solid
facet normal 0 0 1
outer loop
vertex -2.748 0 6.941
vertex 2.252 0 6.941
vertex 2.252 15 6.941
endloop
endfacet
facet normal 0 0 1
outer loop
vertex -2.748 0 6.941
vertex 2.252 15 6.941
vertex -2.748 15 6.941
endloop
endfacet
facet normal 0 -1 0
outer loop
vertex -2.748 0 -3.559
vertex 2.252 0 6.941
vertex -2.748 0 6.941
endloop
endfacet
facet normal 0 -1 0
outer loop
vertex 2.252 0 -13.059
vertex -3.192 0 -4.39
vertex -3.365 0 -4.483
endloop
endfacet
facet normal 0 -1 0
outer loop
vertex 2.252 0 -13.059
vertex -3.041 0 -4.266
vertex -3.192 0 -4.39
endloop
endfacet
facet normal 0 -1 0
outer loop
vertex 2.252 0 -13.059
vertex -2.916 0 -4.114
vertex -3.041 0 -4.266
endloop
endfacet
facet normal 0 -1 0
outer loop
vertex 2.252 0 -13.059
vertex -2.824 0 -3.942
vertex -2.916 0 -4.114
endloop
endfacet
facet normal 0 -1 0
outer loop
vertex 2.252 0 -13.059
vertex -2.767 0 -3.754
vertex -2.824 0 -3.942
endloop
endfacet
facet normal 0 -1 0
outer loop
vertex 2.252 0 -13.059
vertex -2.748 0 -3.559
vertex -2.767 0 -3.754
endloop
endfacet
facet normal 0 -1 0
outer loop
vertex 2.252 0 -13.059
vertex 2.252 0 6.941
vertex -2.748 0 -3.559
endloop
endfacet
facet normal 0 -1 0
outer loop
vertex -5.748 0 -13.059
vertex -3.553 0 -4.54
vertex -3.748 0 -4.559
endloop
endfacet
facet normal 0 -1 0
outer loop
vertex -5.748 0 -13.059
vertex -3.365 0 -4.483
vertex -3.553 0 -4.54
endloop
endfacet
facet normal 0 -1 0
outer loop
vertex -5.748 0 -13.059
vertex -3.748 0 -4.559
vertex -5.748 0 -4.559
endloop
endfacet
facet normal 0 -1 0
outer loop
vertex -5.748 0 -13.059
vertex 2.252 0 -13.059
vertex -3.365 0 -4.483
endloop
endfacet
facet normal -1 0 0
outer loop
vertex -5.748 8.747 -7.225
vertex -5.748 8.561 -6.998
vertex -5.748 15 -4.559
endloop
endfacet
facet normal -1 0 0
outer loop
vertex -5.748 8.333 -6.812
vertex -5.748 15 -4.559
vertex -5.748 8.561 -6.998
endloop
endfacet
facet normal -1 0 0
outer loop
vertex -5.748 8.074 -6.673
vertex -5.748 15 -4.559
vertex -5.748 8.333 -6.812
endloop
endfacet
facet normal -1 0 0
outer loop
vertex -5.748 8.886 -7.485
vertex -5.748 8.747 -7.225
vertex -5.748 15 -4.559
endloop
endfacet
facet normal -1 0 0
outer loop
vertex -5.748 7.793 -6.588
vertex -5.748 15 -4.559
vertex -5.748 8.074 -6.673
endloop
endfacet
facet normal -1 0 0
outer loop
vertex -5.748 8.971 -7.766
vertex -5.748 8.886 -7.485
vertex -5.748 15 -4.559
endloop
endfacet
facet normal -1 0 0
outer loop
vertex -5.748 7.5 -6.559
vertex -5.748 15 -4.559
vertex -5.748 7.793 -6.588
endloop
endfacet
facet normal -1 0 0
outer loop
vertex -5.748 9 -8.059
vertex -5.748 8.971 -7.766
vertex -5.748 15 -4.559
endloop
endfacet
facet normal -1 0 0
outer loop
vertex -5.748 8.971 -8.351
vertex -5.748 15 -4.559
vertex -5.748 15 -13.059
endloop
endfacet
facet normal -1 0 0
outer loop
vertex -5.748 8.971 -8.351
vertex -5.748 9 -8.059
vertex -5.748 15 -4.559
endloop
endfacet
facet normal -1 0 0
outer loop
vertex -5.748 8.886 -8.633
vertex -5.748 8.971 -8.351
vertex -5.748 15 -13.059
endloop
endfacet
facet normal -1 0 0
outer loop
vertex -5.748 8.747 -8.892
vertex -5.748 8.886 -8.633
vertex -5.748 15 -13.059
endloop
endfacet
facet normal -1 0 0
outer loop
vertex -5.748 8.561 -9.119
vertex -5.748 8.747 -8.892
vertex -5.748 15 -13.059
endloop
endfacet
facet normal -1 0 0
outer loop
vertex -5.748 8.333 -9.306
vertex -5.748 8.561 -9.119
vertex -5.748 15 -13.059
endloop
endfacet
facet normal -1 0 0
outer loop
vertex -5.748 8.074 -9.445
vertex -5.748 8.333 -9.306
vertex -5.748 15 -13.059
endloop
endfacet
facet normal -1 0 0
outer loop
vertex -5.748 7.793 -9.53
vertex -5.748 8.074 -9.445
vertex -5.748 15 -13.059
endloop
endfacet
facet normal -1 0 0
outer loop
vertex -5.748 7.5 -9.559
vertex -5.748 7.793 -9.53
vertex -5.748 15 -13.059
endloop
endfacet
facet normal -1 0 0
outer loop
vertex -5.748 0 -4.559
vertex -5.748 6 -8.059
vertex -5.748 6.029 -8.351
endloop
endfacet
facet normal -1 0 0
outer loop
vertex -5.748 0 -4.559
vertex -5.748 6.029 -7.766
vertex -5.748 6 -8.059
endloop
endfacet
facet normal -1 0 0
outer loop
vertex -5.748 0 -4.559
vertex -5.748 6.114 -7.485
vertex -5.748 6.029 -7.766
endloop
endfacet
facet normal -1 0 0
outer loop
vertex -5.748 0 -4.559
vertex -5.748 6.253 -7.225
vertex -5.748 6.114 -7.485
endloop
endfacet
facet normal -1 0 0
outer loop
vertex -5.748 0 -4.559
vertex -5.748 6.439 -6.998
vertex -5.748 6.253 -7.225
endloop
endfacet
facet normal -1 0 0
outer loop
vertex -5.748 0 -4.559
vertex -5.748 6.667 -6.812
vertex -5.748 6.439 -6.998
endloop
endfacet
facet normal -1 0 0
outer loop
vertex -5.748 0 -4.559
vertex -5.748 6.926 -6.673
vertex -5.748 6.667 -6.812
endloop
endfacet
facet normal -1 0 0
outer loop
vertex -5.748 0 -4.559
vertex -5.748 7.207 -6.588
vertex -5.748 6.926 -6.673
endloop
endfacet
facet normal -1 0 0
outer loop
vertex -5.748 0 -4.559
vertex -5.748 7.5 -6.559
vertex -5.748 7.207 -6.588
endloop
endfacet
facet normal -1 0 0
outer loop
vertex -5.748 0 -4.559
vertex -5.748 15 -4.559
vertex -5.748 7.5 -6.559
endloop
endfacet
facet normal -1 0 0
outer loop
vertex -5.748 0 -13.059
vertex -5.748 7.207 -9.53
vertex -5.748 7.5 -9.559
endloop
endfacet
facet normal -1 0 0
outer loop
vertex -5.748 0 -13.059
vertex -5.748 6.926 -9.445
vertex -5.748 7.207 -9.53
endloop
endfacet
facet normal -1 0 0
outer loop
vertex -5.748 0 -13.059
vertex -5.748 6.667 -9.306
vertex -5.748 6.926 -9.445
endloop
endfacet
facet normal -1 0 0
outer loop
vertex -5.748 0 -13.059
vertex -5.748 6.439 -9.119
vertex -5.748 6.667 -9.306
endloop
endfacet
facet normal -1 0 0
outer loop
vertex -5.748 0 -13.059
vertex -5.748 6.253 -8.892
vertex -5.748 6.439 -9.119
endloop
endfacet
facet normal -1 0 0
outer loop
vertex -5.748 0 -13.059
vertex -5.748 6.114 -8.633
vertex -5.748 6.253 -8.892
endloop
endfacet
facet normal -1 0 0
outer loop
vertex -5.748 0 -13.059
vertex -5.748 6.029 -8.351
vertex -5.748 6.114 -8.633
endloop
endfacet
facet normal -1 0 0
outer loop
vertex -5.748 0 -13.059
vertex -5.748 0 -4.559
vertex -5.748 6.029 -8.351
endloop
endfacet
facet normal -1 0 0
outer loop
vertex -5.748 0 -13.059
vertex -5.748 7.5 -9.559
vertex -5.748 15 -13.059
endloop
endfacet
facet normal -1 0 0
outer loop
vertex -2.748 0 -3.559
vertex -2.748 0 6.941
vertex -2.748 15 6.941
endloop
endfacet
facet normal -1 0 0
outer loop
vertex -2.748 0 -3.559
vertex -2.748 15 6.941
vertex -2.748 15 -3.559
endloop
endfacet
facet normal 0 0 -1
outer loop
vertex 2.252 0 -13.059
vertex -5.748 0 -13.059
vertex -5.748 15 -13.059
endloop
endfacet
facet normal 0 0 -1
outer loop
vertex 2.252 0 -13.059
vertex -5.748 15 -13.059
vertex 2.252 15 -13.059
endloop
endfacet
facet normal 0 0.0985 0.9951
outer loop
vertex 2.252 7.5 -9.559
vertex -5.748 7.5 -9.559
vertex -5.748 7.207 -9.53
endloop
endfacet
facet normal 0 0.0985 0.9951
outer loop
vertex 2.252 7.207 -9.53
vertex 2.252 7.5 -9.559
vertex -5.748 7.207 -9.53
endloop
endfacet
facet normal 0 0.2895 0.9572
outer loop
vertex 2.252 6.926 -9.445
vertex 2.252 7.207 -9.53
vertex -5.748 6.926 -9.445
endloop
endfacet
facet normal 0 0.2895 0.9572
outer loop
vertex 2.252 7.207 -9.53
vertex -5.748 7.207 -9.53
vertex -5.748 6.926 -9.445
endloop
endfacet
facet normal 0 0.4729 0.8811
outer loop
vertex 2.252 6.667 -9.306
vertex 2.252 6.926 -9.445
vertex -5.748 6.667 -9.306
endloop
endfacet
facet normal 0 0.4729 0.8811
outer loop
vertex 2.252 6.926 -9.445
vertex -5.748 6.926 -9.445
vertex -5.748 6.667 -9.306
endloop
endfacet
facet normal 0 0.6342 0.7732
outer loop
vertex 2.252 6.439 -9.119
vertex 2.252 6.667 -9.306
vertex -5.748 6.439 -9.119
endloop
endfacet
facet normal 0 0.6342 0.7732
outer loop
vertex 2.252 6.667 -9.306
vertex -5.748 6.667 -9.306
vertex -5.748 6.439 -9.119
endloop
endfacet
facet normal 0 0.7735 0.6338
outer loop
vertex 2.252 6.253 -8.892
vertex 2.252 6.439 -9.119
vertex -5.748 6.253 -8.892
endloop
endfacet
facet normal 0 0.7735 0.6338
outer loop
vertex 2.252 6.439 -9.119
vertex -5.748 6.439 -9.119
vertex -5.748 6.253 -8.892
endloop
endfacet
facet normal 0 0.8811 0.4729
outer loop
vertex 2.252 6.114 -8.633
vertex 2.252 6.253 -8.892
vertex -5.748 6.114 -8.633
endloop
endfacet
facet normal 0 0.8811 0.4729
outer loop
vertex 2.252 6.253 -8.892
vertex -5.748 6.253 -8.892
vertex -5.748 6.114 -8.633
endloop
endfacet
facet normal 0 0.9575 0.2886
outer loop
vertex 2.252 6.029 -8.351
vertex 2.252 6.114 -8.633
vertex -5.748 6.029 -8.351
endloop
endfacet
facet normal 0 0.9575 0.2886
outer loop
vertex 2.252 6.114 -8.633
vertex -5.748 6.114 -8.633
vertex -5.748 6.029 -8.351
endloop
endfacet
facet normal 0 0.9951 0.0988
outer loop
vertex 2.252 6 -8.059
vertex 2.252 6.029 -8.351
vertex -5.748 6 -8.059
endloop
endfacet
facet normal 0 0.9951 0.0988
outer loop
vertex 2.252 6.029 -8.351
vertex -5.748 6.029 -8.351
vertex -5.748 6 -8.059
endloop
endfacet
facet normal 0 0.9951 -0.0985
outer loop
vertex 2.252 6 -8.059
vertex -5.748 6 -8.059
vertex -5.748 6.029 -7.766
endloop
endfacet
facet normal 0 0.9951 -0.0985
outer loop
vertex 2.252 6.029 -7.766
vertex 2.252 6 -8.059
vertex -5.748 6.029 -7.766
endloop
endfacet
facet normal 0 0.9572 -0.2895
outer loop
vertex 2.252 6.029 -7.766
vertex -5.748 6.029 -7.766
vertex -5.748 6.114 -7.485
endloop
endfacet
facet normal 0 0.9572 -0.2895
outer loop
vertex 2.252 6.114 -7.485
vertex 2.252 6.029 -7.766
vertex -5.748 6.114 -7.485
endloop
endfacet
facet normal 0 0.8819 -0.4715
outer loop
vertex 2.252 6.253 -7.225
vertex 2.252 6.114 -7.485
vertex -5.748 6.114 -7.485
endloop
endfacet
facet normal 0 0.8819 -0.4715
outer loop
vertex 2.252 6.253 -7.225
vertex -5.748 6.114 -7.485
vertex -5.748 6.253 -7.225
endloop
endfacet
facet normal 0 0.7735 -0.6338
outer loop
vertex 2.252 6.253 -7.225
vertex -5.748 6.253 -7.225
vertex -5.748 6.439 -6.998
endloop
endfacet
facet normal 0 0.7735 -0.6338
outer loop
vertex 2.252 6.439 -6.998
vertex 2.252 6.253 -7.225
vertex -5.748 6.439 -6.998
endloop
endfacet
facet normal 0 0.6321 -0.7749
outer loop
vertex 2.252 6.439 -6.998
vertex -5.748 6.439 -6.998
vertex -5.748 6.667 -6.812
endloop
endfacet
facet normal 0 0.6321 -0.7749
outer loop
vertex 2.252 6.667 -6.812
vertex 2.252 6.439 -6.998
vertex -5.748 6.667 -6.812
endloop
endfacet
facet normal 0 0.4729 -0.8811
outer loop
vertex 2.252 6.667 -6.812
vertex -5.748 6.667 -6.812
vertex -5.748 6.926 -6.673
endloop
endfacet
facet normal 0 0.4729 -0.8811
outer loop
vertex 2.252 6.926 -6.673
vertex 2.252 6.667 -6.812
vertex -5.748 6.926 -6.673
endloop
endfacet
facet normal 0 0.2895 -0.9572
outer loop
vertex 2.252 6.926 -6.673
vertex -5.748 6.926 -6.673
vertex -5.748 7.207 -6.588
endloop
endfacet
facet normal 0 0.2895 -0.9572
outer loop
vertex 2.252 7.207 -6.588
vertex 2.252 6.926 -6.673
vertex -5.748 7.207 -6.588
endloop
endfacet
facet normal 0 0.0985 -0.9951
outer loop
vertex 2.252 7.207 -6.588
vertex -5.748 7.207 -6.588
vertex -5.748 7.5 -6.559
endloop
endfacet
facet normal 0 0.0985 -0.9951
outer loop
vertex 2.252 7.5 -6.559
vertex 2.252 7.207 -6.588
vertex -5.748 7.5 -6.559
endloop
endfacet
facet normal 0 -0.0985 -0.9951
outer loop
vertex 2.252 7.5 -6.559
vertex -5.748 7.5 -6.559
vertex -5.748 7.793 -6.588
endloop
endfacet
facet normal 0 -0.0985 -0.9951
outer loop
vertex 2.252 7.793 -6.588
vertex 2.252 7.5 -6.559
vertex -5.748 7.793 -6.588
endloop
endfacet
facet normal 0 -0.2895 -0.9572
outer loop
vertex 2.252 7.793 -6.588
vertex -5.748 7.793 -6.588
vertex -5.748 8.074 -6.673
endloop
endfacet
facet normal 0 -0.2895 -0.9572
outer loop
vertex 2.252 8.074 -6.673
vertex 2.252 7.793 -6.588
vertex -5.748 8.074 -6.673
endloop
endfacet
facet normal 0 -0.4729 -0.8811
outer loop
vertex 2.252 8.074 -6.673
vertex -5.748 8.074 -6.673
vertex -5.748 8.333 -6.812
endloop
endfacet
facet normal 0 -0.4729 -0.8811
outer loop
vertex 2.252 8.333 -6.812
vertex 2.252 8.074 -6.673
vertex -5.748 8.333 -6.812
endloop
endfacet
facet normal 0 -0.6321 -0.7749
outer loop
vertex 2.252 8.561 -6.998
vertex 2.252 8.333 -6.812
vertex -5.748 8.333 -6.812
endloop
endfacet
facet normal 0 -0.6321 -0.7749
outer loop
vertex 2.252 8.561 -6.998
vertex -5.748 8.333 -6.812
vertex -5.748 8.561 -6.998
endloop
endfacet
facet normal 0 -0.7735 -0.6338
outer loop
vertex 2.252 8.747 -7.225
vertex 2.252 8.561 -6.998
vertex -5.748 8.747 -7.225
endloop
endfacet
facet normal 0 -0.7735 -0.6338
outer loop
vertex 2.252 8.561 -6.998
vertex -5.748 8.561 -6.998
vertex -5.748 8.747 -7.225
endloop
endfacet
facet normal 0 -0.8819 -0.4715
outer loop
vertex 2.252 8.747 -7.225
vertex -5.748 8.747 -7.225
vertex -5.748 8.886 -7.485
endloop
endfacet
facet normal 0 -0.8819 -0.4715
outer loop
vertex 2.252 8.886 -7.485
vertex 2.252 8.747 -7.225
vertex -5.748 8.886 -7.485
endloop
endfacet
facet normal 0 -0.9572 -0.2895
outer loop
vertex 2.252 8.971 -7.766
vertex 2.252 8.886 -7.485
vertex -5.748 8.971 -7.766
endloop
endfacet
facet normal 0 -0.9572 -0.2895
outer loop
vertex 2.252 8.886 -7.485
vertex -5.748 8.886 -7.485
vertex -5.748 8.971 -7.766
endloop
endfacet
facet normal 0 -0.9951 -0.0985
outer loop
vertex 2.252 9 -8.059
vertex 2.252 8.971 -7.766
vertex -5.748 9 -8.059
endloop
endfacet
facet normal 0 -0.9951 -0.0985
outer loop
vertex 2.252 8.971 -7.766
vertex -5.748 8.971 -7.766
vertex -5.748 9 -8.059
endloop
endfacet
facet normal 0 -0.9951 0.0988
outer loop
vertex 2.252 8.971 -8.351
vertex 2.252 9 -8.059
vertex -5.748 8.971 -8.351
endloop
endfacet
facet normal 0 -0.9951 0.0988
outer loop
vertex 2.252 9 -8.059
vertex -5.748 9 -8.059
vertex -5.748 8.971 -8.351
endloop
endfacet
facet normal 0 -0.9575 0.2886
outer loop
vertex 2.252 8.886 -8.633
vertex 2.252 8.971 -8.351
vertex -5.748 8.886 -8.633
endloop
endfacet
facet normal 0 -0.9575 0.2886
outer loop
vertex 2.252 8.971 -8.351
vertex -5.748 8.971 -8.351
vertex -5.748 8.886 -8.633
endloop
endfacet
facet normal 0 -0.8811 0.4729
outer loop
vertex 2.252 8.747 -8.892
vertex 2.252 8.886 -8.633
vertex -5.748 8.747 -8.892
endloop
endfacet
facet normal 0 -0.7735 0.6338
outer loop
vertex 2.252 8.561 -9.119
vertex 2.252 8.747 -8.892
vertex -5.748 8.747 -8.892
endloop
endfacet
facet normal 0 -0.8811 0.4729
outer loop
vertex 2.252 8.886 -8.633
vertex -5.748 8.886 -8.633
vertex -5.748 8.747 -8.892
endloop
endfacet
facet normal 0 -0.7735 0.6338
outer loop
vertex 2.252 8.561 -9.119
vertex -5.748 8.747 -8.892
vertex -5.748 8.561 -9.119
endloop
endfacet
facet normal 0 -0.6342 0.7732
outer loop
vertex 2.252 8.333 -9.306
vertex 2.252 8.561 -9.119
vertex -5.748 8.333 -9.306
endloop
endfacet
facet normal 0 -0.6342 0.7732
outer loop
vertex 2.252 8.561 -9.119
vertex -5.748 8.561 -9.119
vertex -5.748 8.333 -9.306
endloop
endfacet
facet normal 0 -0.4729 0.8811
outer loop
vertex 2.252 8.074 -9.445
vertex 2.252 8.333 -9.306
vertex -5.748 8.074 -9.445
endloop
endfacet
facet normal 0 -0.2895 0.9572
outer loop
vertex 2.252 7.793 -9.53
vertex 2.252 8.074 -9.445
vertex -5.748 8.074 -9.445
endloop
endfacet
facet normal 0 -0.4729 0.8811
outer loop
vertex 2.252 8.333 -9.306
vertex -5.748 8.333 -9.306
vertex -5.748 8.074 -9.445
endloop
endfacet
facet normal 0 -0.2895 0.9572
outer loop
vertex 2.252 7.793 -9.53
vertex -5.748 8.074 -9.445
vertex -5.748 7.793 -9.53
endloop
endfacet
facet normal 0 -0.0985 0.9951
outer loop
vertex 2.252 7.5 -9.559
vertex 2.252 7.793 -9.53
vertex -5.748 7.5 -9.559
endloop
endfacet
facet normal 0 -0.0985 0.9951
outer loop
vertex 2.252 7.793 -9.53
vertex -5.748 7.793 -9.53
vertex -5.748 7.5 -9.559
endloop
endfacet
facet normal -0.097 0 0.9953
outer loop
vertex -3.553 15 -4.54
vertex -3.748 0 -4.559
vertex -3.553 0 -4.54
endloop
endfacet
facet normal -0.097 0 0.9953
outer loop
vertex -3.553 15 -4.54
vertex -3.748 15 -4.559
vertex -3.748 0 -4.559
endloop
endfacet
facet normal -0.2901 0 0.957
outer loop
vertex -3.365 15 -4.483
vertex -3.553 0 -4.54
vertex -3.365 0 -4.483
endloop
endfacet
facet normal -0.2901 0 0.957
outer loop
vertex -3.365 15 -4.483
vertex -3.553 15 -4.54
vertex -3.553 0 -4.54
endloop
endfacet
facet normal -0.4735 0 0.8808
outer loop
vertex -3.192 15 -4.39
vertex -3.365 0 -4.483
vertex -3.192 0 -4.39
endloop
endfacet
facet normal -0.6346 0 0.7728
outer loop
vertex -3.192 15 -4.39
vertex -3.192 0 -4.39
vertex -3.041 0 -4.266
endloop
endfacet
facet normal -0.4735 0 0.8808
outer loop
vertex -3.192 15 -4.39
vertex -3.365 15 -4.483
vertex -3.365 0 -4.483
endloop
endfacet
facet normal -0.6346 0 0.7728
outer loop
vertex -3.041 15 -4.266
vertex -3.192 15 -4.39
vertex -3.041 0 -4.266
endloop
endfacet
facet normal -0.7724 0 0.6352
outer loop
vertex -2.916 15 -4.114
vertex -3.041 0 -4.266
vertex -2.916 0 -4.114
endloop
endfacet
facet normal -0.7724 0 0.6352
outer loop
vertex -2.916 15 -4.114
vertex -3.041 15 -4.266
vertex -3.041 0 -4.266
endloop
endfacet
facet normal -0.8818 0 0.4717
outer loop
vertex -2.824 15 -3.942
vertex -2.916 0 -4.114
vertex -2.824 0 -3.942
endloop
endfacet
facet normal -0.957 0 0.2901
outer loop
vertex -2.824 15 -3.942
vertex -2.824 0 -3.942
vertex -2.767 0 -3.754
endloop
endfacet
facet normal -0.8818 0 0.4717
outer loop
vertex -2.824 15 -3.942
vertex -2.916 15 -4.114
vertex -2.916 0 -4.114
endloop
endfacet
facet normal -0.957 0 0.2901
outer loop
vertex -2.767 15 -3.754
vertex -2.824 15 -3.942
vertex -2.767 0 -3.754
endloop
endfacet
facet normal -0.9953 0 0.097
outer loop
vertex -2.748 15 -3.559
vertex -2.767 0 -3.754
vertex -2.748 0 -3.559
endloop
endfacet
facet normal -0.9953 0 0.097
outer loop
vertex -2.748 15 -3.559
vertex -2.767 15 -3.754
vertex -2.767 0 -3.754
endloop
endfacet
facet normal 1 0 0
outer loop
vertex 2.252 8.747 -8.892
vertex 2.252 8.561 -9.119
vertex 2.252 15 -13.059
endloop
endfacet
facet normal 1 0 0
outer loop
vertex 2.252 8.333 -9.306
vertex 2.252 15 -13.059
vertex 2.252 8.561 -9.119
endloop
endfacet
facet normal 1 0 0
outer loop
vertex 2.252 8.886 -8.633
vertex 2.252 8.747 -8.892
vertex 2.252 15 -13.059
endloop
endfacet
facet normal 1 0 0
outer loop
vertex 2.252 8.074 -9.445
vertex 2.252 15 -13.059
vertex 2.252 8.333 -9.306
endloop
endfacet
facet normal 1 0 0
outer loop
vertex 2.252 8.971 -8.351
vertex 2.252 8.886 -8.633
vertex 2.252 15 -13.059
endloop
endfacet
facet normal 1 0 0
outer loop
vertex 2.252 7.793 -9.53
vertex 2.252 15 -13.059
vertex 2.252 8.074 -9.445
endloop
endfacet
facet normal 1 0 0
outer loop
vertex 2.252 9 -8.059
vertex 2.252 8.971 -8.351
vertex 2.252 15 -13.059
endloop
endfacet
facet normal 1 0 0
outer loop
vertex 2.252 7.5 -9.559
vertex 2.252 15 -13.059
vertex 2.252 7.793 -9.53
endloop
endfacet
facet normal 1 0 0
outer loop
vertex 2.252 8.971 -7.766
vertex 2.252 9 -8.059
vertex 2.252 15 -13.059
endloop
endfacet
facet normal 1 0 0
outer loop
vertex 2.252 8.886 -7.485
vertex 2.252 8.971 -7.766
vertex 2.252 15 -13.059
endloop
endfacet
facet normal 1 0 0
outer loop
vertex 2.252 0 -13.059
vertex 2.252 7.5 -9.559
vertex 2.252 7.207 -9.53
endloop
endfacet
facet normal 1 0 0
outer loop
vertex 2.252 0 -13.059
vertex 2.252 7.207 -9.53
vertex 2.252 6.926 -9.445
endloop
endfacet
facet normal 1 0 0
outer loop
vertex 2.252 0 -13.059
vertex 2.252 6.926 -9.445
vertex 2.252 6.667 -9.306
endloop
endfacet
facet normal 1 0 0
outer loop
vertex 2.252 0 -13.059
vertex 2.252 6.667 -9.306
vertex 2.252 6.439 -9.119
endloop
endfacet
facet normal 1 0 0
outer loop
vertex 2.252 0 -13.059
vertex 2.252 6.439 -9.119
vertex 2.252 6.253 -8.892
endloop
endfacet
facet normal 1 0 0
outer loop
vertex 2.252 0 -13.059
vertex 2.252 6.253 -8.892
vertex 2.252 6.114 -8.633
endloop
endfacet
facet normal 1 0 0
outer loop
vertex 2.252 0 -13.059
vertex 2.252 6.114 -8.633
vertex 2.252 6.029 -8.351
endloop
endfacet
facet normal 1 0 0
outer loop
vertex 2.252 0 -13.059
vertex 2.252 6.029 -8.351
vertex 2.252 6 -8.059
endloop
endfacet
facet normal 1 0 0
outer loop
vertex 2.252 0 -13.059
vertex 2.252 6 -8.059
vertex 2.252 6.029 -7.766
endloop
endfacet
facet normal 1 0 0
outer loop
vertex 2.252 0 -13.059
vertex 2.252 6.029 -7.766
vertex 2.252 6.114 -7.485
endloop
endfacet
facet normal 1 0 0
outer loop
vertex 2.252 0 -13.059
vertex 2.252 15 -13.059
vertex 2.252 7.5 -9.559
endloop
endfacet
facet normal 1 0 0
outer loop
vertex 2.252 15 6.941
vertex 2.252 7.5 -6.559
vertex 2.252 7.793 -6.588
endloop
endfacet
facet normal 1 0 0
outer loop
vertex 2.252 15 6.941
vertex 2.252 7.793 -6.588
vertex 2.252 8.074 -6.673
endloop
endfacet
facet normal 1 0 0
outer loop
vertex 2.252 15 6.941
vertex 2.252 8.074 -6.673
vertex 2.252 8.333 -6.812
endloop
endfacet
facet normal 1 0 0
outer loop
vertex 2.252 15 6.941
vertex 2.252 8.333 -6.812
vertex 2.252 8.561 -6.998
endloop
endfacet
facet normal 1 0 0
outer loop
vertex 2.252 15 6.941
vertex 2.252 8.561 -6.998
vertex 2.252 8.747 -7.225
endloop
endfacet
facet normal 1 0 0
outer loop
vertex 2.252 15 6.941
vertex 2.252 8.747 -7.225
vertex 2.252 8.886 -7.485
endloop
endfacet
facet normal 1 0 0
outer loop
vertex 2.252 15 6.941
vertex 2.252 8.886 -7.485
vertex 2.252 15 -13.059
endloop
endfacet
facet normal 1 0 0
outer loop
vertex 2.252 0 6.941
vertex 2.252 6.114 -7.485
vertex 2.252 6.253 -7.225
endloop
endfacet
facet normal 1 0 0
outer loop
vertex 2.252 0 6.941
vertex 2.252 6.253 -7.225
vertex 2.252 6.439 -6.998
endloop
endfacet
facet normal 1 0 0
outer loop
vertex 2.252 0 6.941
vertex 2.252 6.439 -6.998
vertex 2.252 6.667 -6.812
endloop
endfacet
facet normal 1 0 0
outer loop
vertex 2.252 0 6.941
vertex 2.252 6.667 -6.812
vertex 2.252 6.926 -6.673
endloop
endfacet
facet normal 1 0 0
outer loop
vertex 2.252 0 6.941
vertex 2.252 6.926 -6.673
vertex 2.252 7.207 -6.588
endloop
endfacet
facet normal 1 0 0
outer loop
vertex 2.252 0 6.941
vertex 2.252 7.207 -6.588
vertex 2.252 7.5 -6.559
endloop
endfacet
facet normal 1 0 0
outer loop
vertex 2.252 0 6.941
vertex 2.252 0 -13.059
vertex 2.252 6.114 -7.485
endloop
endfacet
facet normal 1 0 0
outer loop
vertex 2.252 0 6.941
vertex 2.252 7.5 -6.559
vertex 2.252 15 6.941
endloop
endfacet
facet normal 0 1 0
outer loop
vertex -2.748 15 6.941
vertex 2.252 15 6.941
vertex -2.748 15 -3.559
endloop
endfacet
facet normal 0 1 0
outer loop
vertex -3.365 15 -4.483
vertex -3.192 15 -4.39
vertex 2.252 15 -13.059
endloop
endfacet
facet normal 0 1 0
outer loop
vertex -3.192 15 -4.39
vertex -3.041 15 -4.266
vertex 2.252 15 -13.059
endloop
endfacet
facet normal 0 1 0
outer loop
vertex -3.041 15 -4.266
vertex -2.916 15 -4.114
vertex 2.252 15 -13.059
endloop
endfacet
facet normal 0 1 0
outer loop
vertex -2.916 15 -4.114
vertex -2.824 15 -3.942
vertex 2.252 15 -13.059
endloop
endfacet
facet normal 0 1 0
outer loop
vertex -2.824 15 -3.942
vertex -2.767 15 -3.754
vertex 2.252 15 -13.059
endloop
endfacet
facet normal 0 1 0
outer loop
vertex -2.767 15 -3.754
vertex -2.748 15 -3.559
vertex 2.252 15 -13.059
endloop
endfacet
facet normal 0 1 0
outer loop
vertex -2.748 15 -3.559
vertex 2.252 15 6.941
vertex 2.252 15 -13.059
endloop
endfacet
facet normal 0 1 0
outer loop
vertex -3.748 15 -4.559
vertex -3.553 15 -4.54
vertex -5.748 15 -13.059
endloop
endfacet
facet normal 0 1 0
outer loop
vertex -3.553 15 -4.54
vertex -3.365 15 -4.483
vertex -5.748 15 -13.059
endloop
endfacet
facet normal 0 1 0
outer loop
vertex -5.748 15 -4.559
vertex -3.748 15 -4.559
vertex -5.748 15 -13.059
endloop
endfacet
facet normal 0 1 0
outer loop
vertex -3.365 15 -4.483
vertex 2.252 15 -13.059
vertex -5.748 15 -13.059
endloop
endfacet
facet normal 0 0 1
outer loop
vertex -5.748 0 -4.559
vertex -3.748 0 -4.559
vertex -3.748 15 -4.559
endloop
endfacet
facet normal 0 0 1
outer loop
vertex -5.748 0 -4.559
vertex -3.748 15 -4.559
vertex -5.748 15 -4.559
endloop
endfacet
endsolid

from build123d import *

# Parameters (mm, degrees)
EXTRUDE_1_DEPTH     = 15
CUT_EXTRUDE_1_DEPTH = 15
FILLET_1_R          = 1


with BuildPart() as part:
    # 草图1 → 凸台-拉伸1 (new body)
    with BuildSketch(Plane(origin=(0, 0, 0), x_dir=(1, 0, 0), z_dir=(0, 1, 0))):
        Polygon((-5.74789916, 13.058823529), (2.25210084, 13.058823529), (2.25210084, -6.941176471), (-2.74789916, -6.941176471), (-2.74789916, 4.558823529), (-5.74789916, 4.558823529), align=None)
    extrude(amount=EXTRUDE_1_DEPTH)

    # 草图2 → 切除-拉伸1 (cut)
    with BuildSketch(Plane.ZY.offset(5.74789916)):
        with BuildLine():
            ThreePointArc((-6.558823529, 7.5), (-8.058823529, 9), (-9.558823529, 7.5))
            Line((-9.558823529, 7.5), (-6.558823529, 7.5))
        make_face()
        with BuildLine():
            Line((-6.558823529, 7.5), (-9.558823529, 7.5))
            ThreePointArc((-9.558823529, 7.5), (-8.058823529, 6), (-6.558823529, 7.5))
        make_face()
    extrude(amount=-CUT_EXTRUDE_1_DEPTH, mode=Mode.SUBTRACT)

    # 圆角1
    fillet_1_edges = [part.edges().sort_by_distance(p)[0] for p in [
        (-2.74789916, 7.5, -4.558823529),
    ]]
    fillet(fillet_1_edges, radius=FILLET_1_R)


solid = part.part
